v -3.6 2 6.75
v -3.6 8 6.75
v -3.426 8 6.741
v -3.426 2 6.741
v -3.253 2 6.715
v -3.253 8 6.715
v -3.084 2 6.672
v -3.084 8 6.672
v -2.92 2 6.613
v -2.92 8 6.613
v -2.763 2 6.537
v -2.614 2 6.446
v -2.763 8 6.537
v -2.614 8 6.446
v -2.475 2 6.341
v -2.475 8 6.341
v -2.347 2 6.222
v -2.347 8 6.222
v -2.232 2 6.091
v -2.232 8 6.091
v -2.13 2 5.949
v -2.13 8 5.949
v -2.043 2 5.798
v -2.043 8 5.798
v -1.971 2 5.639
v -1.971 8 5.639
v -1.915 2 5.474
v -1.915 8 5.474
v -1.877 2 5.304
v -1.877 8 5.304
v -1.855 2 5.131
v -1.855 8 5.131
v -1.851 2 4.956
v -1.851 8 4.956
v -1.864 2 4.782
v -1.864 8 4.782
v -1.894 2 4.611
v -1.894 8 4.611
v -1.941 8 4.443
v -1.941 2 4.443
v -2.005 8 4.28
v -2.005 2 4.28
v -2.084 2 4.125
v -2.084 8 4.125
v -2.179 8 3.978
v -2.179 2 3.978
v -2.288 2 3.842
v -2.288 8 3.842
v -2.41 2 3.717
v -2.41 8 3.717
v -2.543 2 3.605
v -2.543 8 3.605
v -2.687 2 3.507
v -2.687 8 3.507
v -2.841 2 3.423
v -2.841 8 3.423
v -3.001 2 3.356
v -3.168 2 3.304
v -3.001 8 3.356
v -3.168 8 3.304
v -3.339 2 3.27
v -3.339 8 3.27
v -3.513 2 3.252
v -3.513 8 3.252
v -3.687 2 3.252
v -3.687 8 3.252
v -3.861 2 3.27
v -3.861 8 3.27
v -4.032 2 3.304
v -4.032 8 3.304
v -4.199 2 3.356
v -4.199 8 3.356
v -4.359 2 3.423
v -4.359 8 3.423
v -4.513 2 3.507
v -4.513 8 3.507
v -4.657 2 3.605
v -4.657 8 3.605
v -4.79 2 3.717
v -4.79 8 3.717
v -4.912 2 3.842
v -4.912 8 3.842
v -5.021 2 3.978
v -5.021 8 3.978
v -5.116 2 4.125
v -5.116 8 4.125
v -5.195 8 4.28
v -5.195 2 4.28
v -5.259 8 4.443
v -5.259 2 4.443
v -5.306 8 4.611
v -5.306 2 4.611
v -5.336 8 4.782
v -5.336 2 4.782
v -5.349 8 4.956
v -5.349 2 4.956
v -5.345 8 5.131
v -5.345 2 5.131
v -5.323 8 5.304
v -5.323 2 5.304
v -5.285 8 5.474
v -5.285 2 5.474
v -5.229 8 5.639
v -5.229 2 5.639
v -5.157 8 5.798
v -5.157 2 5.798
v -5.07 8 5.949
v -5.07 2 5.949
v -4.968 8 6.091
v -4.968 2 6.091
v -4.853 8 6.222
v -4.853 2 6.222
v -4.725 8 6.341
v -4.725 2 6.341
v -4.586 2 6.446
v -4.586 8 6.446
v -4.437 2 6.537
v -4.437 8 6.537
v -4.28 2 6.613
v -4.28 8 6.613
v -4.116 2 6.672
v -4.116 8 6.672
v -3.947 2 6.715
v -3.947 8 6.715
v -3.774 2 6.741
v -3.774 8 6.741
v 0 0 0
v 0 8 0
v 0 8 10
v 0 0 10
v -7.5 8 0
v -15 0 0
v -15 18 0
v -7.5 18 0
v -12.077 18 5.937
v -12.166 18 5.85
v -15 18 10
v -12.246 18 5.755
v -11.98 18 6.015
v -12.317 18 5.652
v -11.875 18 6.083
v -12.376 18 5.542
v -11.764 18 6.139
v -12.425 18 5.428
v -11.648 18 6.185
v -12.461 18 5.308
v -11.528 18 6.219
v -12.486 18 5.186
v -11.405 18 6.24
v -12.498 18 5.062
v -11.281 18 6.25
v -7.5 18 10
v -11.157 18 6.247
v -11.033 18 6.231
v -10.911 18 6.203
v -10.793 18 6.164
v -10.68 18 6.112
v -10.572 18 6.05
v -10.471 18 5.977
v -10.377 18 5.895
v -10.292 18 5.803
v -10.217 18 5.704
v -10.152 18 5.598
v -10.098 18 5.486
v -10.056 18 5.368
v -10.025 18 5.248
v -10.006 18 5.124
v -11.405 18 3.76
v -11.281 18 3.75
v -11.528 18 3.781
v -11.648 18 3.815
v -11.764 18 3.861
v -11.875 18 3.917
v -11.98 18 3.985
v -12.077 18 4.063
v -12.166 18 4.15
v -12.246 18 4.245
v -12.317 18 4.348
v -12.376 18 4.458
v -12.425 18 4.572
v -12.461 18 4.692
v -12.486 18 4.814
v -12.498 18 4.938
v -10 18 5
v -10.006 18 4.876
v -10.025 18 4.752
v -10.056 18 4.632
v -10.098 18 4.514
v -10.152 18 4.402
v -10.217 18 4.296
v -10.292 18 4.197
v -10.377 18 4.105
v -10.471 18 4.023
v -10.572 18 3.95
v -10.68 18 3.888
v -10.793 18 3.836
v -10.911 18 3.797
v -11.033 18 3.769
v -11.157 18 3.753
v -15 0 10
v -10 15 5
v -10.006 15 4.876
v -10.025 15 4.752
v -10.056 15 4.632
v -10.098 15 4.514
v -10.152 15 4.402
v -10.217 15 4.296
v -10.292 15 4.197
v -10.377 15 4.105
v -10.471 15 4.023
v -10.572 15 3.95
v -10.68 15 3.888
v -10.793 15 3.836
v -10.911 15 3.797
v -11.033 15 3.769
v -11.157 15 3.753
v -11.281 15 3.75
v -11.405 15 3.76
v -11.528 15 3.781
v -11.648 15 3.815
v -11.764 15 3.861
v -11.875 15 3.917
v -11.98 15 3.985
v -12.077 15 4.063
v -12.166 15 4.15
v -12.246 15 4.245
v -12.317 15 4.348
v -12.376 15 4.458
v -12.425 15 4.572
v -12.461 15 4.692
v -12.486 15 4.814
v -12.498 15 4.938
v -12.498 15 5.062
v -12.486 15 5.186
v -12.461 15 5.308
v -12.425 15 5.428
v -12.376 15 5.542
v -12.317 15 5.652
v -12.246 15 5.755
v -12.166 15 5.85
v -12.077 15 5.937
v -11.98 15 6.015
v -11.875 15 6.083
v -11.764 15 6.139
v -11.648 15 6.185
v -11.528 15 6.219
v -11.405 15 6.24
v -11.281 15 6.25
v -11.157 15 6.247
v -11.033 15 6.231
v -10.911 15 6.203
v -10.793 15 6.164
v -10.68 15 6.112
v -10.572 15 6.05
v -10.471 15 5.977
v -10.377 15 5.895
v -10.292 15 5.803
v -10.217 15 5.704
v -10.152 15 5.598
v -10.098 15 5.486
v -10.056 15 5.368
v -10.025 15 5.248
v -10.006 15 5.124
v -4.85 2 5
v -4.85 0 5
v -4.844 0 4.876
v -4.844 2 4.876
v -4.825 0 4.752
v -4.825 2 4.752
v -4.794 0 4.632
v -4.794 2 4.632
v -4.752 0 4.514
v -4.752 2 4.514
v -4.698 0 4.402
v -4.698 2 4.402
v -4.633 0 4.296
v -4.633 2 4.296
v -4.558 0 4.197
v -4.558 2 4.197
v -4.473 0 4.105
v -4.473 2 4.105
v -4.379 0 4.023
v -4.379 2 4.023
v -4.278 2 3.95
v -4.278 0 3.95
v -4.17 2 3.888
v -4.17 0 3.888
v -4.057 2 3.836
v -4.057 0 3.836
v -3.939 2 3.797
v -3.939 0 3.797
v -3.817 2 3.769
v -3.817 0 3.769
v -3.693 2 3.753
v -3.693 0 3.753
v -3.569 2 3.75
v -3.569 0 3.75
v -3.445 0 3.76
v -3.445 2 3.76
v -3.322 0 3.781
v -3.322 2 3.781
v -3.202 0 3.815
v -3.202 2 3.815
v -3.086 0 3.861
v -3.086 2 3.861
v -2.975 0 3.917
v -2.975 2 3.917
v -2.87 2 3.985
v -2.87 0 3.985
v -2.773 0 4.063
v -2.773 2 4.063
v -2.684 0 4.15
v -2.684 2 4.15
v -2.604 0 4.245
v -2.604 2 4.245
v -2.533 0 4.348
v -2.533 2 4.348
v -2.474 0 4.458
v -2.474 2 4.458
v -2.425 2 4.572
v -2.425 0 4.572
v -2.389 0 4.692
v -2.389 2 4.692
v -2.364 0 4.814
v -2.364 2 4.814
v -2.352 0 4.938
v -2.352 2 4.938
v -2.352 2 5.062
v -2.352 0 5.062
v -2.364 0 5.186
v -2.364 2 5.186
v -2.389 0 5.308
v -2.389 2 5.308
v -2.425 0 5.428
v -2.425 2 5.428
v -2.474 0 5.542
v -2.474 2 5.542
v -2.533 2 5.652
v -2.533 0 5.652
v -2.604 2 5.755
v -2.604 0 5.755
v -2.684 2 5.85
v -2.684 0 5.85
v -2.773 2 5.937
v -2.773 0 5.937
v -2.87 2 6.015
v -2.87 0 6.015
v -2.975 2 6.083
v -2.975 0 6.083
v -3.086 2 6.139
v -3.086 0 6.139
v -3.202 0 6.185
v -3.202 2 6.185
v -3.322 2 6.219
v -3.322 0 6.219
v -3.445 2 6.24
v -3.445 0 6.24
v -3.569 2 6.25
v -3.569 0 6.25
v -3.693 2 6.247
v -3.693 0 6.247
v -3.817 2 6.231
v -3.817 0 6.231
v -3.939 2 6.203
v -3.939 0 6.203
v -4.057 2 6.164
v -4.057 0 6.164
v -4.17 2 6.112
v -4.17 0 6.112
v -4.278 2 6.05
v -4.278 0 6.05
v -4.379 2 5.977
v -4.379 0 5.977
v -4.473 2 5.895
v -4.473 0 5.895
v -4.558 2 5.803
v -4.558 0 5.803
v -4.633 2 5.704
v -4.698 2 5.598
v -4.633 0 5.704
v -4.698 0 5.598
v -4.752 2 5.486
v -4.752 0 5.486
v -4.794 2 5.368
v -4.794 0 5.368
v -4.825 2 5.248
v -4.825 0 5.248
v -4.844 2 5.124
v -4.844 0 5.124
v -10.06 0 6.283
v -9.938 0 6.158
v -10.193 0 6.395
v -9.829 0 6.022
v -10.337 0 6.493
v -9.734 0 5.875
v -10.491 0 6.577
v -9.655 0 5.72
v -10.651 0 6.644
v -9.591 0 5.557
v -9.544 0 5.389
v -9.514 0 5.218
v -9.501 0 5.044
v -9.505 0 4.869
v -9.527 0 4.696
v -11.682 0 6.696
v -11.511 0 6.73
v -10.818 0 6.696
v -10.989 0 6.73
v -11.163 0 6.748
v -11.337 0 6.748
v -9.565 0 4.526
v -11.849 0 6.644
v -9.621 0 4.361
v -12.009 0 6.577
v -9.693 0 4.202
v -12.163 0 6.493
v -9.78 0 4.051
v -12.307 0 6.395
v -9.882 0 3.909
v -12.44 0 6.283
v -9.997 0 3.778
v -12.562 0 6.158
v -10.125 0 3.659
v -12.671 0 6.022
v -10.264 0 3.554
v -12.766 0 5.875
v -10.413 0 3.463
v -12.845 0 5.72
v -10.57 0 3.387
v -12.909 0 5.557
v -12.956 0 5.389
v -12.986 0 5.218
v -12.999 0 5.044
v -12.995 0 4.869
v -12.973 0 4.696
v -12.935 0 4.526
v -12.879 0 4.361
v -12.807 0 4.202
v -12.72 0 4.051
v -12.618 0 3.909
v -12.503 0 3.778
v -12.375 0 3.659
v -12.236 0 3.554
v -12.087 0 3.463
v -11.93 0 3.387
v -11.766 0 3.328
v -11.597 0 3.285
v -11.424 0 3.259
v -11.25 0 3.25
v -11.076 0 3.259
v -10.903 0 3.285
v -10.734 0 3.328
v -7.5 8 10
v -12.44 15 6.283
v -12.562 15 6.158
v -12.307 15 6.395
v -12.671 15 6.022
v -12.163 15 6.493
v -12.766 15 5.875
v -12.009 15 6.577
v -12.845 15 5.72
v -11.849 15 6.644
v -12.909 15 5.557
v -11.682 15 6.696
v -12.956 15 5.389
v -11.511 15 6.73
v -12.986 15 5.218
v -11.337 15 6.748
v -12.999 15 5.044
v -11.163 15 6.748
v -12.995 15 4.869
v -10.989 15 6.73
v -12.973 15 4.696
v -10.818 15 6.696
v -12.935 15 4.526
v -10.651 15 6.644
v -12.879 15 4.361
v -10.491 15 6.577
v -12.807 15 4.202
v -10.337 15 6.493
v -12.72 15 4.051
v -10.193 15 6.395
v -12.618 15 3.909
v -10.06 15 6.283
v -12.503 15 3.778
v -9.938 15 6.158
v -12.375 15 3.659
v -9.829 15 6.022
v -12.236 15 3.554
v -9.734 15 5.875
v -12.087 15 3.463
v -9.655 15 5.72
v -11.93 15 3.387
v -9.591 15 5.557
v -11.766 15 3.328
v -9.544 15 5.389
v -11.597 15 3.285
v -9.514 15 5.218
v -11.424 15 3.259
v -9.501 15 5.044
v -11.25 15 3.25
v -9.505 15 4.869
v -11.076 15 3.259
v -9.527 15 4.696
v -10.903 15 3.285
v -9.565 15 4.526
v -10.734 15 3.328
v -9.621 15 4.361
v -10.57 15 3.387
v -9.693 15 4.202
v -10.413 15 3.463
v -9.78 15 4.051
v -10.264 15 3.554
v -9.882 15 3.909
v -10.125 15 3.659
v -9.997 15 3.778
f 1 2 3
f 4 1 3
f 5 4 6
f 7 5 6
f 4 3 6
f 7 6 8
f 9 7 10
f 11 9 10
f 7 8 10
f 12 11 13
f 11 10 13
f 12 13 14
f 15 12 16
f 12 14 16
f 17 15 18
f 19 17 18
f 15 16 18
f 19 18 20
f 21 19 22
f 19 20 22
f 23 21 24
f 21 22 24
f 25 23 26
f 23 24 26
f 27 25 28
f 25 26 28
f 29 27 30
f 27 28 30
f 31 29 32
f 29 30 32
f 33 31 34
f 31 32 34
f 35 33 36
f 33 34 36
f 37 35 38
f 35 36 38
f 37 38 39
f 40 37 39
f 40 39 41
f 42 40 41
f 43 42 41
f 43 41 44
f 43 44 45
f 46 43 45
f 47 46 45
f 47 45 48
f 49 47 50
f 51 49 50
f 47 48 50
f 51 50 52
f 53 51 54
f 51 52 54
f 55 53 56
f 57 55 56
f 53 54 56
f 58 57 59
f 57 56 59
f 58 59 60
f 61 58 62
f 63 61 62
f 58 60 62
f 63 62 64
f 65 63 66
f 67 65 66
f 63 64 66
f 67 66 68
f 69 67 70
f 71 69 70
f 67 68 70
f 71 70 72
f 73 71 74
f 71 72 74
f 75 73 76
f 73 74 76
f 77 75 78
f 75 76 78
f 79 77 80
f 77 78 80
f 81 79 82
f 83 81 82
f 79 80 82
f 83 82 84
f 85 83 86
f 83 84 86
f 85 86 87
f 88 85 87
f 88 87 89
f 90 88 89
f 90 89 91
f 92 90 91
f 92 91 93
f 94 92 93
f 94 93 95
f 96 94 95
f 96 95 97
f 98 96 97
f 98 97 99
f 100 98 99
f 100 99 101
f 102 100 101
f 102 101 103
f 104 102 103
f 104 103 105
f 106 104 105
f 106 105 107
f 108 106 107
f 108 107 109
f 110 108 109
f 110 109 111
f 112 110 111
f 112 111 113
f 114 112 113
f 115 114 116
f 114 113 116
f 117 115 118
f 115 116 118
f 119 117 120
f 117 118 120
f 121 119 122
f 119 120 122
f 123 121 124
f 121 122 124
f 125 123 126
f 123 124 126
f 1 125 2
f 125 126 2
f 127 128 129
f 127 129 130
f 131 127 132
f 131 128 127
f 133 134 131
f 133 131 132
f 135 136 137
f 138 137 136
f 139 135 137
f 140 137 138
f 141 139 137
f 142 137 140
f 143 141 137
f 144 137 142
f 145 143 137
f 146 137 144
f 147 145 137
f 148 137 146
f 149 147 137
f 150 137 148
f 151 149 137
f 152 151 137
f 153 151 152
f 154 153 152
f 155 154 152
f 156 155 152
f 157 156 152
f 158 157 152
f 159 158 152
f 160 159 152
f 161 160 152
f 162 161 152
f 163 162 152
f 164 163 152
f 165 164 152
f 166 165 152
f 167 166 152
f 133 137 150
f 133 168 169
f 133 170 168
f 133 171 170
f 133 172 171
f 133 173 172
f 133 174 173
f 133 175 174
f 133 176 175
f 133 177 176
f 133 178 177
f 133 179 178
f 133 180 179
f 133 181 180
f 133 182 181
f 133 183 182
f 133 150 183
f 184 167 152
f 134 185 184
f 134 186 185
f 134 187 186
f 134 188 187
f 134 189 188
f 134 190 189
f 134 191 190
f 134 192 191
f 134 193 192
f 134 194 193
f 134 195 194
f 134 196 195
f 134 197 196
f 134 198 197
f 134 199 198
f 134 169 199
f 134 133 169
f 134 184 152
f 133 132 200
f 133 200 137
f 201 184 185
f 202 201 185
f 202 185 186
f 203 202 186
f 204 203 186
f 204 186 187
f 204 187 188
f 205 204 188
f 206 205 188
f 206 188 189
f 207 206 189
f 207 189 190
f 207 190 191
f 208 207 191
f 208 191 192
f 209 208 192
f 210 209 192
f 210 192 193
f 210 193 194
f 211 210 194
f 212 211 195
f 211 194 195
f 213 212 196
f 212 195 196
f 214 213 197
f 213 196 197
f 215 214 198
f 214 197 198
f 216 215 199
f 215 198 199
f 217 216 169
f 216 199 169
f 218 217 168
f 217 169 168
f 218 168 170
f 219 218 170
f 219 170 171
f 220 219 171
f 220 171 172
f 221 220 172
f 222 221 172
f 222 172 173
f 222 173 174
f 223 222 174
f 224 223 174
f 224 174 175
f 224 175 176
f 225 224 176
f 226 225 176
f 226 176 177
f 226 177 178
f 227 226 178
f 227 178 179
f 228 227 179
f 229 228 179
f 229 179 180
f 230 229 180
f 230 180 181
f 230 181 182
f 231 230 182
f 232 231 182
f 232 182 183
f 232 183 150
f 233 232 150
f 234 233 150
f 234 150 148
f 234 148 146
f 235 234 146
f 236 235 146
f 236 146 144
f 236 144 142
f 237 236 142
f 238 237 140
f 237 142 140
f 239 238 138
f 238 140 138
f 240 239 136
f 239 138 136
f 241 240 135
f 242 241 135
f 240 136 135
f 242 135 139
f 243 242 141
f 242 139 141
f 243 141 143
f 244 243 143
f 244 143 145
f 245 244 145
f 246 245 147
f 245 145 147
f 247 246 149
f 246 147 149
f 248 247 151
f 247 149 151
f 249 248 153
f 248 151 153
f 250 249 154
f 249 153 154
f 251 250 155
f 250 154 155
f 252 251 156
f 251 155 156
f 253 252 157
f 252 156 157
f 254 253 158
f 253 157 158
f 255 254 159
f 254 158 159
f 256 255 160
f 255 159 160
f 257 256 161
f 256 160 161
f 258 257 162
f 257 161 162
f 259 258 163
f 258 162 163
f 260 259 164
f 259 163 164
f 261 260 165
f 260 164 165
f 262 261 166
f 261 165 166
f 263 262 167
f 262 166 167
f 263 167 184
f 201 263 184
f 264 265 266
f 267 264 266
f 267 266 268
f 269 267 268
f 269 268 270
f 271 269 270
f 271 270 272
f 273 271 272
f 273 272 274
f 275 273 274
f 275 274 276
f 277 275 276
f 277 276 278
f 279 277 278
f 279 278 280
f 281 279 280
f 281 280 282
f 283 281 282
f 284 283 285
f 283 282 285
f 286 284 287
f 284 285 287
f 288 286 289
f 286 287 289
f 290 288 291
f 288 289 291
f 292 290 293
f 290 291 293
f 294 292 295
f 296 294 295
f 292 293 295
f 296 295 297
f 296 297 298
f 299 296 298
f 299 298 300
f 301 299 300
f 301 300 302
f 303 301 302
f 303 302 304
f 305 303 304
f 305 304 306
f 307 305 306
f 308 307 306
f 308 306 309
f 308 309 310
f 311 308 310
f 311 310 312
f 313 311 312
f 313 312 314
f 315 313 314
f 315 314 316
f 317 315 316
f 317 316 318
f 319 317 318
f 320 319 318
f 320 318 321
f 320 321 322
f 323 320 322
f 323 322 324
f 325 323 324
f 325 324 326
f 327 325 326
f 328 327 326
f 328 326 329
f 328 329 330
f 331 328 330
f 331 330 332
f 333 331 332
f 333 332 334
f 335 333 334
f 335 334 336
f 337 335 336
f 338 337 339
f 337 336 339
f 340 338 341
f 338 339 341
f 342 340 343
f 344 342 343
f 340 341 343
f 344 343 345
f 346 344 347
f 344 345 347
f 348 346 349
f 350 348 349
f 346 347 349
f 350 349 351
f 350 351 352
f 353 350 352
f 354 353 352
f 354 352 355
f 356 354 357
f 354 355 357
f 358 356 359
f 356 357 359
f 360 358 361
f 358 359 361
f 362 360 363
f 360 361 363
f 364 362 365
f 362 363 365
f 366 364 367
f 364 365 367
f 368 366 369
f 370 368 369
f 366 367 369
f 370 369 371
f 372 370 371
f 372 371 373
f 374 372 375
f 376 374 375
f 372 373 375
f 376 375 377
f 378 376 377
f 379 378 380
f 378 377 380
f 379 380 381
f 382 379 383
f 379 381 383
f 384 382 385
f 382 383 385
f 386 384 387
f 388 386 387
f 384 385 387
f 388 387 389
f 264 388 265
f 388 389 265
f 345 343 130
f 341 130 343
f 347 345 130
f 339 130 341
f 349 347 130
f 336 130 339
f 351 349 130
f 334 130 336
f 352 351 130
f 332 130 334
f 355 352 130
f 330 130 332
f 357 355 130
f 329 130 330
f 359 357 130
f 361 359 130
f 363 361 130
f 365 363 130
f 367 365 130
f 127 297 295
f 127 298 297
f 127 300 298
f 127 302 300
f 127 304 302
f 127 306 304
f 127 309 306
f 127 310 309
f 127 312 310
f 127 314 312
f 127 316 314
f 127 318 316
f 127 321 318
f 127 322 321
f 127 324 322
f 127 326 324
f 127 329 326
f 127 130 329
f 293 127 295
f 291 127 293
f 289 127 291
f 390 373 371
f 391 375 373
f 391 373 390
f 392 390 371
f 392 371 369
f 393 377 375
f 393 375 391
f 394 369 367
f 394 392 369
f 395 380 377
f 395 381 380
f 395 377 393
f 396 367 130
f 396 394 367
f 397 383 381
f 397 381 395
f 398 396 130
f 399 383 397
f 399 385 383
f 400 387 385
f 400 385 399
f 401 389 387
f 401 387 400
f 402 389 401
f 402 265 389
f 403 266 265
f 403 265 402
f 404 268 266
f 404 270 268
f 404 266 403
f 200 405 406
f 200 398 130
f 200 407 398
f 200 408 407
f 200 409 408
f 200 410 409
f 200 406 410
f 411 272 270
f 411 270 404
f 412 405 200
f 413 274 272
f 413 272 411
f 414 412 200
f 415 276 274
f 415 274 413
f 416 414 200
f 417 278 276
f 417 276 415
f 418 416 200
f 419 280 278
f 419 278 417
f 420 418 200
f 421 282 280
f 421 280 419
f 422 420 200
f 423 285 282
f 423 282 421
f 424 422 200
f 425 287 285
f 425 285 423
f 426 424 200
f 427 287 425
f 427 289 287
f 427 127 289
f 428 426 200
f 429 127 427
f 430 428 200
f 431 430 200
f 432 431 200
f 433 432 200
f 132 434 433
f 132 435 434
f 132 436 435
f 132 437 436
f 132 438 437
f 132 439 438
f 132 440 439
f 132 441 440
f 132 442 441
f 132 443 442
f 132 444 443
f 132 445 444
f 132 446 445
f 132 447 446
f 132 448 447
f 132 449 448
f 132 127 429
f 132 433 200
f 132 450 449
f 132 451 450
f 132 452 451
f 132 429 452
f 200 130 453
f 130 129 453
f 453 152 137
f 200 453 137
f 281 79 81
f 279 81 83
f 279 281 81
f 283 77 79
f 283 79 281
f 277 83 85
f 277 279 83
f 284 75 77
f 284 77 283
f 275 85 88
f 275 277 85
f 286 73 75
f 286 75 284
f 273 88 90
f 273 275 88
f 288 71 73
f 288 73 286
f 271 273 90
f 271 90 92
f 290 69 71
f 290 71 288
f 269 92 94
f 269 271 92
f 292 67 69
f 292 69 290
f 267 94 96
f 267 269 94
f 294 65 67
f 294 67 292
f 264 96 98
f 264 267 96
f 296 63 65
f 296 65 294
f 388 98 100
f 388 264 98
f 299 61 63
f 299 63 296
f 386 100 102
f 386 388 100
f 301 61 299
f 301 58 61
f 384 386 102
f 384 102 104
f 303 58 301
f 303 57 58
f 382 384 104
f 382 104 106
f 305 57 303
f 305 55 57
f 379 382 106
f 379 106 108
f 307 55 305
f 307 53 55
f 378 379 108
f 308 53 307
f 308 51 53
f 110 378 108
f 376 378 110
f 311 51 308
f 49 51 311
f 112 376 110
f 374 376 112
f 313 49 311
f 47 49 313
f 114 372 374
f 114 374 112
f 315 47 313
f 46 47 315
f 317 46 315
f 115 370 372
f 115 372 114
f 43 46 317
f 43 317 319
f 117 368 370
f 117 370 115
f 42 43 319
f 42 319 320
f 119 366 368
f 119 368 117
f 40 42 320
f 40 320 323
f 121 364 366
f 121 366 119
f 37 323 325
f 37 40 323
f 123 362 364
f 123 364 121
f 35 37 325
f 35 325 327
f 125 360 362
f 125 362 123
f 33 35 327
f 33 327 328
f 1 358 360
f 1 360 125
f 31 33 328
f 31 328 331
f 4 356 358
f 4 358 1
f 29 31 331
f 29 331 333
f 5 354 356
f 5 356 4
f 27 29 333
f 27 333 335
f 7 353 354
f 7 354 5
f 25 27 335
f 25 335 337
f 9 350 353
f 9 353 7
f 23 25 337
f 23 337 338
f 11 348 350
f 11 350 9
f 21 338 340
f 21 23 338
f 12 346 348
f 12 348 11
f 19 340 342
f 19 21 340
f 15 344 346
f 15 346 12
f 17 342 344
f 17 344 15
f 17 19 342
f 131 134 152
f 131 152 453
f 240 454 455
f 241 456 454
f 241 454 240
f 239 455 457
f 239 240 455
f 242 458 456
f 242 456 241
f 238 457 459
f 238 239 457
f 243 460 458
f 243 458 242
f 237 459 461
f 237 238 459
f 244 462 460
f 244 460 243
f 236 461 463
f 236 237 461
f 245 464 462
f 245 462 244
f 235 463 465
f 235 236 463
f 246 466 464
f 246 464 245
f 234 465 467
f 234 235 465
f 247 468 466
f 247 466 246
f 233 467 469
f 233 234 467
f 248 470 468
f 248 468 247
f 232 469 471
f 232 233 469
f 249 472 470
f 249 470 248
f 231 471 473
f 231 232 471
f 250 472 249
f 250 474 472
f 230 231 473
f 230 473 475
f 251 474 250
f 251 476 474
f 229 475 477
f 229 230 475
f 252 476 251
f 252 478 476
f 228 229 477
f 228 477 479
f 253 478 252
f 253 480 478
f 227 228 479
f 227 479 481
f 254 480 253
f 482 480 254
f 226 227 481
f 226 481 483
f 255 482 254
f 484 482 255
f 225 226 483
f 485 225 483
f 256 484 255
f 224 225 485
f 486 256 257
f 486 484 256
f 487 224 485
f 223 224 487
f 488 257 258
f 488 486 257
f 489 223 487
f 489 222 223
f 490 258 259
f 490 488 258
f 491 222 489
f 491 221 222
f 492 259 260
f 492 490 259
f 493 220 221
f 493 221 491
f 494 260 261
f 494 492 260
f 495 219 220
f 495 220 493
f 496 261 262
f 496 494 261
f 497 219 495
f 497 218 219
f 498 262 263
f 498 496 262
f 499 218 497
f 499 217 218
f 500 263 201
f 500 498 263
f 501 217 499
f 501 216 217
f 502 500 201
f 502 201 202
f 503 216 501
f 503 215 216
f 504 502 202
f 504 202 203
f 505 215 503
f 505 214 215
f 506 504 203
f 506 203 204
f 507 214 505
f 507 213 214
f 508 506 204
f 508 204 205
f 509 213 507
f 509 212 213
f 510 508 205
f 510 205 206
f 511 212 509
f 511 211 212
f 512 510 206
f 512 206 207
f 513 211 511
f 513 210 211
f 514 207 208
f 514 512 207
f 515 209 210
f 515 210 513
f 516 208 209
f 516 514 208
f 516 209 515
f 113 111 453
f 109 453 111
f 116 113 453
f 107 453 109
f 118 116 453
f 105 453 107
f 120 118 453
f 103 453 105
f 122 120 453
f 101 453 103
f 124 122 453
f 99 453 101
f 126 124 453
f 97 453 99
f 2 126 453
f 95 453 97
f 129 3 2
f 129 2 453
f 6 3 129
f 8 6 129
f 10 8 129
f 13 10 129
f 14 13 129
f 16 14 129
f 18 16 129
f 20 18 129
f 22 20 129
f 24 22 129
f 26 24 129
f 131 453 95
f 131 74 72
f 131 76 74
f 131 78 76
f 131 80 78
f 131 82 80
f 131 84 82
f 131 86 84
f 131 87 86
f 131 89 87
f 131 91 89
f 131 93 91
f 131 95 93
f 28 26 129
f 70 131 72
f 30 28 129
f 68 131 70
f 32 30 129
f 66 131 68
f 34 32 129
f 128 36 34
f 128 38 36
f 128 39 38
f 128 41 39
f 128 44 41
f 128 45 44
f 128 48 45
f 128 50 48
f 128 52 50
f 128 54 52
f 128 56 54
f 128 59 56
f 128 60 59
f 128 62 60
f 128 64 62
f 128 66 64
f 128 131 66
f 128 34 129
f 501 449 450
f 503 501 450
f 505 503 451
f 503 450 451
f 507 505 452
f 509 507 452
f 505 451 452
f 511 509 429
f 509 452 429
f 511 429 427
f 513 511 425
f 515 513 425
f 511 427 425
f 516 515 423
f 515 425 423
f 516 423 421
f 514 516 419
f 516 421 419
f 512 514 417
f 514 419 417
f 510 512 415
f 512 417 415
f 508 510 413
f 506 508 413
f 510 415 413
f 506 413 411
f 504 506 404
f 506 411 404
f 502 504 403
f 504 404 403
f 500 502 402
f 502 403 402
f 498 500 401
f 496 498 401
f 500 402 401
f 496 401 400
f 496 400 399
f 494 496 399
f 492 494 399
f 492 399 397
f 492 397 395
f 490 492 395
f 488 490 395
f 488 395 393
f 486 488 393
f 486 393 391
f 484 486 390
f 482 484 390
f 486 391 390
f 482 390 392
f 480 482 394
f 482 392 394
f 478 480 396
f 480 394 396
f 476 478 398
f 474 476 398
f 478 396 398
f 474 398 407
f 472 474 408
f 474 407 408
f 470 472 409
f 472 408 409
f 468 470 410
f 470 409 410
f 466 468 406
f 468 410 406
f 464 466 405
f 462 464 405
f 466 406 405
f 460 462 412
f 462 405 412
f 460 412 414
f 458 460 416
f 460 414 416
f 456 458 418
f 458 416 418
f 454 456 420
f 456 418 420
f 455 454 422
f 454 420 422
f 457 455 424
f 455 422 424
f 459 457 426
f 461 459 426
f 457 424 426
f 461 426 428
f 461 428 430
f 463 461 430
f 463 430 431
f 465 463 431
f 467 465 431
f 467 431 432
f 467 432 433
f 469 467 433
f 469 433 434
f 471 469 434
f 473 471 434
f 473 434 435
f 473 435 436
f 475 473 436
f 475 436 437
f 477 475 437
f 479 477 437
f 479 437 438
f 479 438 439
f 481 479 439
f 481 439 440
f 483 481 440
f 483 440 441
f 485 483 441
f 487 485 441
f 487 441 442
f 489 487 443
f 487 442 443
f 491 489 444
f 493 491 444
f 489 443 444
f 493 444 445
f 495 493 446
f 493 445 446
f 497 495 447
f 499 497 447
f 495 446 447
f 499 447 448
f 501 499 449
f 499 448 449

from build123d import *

# Parameters (mm, degrees)
BOSS_EXTRUDE1_DEPTH   = 10
SKETCH6_R             = 1.75
CUT_EXTRUDE1_DEPTH    = 6
F_2_5MM_DOWEL_HOLE1_D = 2.5
SKETCH9_R             = 1.75
CUT_EXTRUDE2_DEPTH    = 15
F_2_5MM_DOWEL_HOLE2_D = 2.5


with BuildPart() as part:
    # Sketch1 → Boss-Extrude1 (new body)
    with BuildSketch(Plane.XY):
        Polygon((0, 0), (-15, 0), (-15, 18), (-7.5, 18), (-7.5, 8), (0, 8), align=None)
    extrude(amount=BOSS_EXTRUDE1_DEPTH)

    # Sketch6 → Cut-Extrude1 (cut)
    with BuildSketch(Plane(origin=(0, 8, 0), x_dir=(1, 0, 0), z_dir=(0, 1, 0))):
        with Locations(Location((-3.6, -5, 0), (0, 0, 270))):
            Circle(SKETCH6_R)
    extrude(amount=-CUT_EXTRUDE1_DEPTH, mode=Mode.SUBTRACT)

    # Ø2.5mm Dowel Hole1 (through all)
    with Locations(Plane(origin=(0, 2, 0), x_dir=(1, 0, 0), z_dir=(0, 1, 0))):
        with Locations((-3.6, -5)):
            Hole(F_2_5MM_DOWEL_HOLE1_D / 2)

    # Sketch9 → Cut-Extrude2 (cut)
    with BuildSketch(Plane.XZ):
        with Locations(Location((-11.25, 5, 0), (0, 0, 270))):
            Circle(SKETCH9_R)
    extrude(amount=-CUT_EXTRUDE2_DEPTH, mode=Mode.SUBTRACT)

    # Ø2.5mm Dowel Hole2 (through all)
    with Locations(Plane(origin=(0, 15, 0), x_dir=(-1, 0, 0), z_dir=(0, -1, 0))):
        with Locations((11.25, -5)):
            Hole(F_2_5MM_DOWEL_HOLE2_D / 2)


solid = part.part
